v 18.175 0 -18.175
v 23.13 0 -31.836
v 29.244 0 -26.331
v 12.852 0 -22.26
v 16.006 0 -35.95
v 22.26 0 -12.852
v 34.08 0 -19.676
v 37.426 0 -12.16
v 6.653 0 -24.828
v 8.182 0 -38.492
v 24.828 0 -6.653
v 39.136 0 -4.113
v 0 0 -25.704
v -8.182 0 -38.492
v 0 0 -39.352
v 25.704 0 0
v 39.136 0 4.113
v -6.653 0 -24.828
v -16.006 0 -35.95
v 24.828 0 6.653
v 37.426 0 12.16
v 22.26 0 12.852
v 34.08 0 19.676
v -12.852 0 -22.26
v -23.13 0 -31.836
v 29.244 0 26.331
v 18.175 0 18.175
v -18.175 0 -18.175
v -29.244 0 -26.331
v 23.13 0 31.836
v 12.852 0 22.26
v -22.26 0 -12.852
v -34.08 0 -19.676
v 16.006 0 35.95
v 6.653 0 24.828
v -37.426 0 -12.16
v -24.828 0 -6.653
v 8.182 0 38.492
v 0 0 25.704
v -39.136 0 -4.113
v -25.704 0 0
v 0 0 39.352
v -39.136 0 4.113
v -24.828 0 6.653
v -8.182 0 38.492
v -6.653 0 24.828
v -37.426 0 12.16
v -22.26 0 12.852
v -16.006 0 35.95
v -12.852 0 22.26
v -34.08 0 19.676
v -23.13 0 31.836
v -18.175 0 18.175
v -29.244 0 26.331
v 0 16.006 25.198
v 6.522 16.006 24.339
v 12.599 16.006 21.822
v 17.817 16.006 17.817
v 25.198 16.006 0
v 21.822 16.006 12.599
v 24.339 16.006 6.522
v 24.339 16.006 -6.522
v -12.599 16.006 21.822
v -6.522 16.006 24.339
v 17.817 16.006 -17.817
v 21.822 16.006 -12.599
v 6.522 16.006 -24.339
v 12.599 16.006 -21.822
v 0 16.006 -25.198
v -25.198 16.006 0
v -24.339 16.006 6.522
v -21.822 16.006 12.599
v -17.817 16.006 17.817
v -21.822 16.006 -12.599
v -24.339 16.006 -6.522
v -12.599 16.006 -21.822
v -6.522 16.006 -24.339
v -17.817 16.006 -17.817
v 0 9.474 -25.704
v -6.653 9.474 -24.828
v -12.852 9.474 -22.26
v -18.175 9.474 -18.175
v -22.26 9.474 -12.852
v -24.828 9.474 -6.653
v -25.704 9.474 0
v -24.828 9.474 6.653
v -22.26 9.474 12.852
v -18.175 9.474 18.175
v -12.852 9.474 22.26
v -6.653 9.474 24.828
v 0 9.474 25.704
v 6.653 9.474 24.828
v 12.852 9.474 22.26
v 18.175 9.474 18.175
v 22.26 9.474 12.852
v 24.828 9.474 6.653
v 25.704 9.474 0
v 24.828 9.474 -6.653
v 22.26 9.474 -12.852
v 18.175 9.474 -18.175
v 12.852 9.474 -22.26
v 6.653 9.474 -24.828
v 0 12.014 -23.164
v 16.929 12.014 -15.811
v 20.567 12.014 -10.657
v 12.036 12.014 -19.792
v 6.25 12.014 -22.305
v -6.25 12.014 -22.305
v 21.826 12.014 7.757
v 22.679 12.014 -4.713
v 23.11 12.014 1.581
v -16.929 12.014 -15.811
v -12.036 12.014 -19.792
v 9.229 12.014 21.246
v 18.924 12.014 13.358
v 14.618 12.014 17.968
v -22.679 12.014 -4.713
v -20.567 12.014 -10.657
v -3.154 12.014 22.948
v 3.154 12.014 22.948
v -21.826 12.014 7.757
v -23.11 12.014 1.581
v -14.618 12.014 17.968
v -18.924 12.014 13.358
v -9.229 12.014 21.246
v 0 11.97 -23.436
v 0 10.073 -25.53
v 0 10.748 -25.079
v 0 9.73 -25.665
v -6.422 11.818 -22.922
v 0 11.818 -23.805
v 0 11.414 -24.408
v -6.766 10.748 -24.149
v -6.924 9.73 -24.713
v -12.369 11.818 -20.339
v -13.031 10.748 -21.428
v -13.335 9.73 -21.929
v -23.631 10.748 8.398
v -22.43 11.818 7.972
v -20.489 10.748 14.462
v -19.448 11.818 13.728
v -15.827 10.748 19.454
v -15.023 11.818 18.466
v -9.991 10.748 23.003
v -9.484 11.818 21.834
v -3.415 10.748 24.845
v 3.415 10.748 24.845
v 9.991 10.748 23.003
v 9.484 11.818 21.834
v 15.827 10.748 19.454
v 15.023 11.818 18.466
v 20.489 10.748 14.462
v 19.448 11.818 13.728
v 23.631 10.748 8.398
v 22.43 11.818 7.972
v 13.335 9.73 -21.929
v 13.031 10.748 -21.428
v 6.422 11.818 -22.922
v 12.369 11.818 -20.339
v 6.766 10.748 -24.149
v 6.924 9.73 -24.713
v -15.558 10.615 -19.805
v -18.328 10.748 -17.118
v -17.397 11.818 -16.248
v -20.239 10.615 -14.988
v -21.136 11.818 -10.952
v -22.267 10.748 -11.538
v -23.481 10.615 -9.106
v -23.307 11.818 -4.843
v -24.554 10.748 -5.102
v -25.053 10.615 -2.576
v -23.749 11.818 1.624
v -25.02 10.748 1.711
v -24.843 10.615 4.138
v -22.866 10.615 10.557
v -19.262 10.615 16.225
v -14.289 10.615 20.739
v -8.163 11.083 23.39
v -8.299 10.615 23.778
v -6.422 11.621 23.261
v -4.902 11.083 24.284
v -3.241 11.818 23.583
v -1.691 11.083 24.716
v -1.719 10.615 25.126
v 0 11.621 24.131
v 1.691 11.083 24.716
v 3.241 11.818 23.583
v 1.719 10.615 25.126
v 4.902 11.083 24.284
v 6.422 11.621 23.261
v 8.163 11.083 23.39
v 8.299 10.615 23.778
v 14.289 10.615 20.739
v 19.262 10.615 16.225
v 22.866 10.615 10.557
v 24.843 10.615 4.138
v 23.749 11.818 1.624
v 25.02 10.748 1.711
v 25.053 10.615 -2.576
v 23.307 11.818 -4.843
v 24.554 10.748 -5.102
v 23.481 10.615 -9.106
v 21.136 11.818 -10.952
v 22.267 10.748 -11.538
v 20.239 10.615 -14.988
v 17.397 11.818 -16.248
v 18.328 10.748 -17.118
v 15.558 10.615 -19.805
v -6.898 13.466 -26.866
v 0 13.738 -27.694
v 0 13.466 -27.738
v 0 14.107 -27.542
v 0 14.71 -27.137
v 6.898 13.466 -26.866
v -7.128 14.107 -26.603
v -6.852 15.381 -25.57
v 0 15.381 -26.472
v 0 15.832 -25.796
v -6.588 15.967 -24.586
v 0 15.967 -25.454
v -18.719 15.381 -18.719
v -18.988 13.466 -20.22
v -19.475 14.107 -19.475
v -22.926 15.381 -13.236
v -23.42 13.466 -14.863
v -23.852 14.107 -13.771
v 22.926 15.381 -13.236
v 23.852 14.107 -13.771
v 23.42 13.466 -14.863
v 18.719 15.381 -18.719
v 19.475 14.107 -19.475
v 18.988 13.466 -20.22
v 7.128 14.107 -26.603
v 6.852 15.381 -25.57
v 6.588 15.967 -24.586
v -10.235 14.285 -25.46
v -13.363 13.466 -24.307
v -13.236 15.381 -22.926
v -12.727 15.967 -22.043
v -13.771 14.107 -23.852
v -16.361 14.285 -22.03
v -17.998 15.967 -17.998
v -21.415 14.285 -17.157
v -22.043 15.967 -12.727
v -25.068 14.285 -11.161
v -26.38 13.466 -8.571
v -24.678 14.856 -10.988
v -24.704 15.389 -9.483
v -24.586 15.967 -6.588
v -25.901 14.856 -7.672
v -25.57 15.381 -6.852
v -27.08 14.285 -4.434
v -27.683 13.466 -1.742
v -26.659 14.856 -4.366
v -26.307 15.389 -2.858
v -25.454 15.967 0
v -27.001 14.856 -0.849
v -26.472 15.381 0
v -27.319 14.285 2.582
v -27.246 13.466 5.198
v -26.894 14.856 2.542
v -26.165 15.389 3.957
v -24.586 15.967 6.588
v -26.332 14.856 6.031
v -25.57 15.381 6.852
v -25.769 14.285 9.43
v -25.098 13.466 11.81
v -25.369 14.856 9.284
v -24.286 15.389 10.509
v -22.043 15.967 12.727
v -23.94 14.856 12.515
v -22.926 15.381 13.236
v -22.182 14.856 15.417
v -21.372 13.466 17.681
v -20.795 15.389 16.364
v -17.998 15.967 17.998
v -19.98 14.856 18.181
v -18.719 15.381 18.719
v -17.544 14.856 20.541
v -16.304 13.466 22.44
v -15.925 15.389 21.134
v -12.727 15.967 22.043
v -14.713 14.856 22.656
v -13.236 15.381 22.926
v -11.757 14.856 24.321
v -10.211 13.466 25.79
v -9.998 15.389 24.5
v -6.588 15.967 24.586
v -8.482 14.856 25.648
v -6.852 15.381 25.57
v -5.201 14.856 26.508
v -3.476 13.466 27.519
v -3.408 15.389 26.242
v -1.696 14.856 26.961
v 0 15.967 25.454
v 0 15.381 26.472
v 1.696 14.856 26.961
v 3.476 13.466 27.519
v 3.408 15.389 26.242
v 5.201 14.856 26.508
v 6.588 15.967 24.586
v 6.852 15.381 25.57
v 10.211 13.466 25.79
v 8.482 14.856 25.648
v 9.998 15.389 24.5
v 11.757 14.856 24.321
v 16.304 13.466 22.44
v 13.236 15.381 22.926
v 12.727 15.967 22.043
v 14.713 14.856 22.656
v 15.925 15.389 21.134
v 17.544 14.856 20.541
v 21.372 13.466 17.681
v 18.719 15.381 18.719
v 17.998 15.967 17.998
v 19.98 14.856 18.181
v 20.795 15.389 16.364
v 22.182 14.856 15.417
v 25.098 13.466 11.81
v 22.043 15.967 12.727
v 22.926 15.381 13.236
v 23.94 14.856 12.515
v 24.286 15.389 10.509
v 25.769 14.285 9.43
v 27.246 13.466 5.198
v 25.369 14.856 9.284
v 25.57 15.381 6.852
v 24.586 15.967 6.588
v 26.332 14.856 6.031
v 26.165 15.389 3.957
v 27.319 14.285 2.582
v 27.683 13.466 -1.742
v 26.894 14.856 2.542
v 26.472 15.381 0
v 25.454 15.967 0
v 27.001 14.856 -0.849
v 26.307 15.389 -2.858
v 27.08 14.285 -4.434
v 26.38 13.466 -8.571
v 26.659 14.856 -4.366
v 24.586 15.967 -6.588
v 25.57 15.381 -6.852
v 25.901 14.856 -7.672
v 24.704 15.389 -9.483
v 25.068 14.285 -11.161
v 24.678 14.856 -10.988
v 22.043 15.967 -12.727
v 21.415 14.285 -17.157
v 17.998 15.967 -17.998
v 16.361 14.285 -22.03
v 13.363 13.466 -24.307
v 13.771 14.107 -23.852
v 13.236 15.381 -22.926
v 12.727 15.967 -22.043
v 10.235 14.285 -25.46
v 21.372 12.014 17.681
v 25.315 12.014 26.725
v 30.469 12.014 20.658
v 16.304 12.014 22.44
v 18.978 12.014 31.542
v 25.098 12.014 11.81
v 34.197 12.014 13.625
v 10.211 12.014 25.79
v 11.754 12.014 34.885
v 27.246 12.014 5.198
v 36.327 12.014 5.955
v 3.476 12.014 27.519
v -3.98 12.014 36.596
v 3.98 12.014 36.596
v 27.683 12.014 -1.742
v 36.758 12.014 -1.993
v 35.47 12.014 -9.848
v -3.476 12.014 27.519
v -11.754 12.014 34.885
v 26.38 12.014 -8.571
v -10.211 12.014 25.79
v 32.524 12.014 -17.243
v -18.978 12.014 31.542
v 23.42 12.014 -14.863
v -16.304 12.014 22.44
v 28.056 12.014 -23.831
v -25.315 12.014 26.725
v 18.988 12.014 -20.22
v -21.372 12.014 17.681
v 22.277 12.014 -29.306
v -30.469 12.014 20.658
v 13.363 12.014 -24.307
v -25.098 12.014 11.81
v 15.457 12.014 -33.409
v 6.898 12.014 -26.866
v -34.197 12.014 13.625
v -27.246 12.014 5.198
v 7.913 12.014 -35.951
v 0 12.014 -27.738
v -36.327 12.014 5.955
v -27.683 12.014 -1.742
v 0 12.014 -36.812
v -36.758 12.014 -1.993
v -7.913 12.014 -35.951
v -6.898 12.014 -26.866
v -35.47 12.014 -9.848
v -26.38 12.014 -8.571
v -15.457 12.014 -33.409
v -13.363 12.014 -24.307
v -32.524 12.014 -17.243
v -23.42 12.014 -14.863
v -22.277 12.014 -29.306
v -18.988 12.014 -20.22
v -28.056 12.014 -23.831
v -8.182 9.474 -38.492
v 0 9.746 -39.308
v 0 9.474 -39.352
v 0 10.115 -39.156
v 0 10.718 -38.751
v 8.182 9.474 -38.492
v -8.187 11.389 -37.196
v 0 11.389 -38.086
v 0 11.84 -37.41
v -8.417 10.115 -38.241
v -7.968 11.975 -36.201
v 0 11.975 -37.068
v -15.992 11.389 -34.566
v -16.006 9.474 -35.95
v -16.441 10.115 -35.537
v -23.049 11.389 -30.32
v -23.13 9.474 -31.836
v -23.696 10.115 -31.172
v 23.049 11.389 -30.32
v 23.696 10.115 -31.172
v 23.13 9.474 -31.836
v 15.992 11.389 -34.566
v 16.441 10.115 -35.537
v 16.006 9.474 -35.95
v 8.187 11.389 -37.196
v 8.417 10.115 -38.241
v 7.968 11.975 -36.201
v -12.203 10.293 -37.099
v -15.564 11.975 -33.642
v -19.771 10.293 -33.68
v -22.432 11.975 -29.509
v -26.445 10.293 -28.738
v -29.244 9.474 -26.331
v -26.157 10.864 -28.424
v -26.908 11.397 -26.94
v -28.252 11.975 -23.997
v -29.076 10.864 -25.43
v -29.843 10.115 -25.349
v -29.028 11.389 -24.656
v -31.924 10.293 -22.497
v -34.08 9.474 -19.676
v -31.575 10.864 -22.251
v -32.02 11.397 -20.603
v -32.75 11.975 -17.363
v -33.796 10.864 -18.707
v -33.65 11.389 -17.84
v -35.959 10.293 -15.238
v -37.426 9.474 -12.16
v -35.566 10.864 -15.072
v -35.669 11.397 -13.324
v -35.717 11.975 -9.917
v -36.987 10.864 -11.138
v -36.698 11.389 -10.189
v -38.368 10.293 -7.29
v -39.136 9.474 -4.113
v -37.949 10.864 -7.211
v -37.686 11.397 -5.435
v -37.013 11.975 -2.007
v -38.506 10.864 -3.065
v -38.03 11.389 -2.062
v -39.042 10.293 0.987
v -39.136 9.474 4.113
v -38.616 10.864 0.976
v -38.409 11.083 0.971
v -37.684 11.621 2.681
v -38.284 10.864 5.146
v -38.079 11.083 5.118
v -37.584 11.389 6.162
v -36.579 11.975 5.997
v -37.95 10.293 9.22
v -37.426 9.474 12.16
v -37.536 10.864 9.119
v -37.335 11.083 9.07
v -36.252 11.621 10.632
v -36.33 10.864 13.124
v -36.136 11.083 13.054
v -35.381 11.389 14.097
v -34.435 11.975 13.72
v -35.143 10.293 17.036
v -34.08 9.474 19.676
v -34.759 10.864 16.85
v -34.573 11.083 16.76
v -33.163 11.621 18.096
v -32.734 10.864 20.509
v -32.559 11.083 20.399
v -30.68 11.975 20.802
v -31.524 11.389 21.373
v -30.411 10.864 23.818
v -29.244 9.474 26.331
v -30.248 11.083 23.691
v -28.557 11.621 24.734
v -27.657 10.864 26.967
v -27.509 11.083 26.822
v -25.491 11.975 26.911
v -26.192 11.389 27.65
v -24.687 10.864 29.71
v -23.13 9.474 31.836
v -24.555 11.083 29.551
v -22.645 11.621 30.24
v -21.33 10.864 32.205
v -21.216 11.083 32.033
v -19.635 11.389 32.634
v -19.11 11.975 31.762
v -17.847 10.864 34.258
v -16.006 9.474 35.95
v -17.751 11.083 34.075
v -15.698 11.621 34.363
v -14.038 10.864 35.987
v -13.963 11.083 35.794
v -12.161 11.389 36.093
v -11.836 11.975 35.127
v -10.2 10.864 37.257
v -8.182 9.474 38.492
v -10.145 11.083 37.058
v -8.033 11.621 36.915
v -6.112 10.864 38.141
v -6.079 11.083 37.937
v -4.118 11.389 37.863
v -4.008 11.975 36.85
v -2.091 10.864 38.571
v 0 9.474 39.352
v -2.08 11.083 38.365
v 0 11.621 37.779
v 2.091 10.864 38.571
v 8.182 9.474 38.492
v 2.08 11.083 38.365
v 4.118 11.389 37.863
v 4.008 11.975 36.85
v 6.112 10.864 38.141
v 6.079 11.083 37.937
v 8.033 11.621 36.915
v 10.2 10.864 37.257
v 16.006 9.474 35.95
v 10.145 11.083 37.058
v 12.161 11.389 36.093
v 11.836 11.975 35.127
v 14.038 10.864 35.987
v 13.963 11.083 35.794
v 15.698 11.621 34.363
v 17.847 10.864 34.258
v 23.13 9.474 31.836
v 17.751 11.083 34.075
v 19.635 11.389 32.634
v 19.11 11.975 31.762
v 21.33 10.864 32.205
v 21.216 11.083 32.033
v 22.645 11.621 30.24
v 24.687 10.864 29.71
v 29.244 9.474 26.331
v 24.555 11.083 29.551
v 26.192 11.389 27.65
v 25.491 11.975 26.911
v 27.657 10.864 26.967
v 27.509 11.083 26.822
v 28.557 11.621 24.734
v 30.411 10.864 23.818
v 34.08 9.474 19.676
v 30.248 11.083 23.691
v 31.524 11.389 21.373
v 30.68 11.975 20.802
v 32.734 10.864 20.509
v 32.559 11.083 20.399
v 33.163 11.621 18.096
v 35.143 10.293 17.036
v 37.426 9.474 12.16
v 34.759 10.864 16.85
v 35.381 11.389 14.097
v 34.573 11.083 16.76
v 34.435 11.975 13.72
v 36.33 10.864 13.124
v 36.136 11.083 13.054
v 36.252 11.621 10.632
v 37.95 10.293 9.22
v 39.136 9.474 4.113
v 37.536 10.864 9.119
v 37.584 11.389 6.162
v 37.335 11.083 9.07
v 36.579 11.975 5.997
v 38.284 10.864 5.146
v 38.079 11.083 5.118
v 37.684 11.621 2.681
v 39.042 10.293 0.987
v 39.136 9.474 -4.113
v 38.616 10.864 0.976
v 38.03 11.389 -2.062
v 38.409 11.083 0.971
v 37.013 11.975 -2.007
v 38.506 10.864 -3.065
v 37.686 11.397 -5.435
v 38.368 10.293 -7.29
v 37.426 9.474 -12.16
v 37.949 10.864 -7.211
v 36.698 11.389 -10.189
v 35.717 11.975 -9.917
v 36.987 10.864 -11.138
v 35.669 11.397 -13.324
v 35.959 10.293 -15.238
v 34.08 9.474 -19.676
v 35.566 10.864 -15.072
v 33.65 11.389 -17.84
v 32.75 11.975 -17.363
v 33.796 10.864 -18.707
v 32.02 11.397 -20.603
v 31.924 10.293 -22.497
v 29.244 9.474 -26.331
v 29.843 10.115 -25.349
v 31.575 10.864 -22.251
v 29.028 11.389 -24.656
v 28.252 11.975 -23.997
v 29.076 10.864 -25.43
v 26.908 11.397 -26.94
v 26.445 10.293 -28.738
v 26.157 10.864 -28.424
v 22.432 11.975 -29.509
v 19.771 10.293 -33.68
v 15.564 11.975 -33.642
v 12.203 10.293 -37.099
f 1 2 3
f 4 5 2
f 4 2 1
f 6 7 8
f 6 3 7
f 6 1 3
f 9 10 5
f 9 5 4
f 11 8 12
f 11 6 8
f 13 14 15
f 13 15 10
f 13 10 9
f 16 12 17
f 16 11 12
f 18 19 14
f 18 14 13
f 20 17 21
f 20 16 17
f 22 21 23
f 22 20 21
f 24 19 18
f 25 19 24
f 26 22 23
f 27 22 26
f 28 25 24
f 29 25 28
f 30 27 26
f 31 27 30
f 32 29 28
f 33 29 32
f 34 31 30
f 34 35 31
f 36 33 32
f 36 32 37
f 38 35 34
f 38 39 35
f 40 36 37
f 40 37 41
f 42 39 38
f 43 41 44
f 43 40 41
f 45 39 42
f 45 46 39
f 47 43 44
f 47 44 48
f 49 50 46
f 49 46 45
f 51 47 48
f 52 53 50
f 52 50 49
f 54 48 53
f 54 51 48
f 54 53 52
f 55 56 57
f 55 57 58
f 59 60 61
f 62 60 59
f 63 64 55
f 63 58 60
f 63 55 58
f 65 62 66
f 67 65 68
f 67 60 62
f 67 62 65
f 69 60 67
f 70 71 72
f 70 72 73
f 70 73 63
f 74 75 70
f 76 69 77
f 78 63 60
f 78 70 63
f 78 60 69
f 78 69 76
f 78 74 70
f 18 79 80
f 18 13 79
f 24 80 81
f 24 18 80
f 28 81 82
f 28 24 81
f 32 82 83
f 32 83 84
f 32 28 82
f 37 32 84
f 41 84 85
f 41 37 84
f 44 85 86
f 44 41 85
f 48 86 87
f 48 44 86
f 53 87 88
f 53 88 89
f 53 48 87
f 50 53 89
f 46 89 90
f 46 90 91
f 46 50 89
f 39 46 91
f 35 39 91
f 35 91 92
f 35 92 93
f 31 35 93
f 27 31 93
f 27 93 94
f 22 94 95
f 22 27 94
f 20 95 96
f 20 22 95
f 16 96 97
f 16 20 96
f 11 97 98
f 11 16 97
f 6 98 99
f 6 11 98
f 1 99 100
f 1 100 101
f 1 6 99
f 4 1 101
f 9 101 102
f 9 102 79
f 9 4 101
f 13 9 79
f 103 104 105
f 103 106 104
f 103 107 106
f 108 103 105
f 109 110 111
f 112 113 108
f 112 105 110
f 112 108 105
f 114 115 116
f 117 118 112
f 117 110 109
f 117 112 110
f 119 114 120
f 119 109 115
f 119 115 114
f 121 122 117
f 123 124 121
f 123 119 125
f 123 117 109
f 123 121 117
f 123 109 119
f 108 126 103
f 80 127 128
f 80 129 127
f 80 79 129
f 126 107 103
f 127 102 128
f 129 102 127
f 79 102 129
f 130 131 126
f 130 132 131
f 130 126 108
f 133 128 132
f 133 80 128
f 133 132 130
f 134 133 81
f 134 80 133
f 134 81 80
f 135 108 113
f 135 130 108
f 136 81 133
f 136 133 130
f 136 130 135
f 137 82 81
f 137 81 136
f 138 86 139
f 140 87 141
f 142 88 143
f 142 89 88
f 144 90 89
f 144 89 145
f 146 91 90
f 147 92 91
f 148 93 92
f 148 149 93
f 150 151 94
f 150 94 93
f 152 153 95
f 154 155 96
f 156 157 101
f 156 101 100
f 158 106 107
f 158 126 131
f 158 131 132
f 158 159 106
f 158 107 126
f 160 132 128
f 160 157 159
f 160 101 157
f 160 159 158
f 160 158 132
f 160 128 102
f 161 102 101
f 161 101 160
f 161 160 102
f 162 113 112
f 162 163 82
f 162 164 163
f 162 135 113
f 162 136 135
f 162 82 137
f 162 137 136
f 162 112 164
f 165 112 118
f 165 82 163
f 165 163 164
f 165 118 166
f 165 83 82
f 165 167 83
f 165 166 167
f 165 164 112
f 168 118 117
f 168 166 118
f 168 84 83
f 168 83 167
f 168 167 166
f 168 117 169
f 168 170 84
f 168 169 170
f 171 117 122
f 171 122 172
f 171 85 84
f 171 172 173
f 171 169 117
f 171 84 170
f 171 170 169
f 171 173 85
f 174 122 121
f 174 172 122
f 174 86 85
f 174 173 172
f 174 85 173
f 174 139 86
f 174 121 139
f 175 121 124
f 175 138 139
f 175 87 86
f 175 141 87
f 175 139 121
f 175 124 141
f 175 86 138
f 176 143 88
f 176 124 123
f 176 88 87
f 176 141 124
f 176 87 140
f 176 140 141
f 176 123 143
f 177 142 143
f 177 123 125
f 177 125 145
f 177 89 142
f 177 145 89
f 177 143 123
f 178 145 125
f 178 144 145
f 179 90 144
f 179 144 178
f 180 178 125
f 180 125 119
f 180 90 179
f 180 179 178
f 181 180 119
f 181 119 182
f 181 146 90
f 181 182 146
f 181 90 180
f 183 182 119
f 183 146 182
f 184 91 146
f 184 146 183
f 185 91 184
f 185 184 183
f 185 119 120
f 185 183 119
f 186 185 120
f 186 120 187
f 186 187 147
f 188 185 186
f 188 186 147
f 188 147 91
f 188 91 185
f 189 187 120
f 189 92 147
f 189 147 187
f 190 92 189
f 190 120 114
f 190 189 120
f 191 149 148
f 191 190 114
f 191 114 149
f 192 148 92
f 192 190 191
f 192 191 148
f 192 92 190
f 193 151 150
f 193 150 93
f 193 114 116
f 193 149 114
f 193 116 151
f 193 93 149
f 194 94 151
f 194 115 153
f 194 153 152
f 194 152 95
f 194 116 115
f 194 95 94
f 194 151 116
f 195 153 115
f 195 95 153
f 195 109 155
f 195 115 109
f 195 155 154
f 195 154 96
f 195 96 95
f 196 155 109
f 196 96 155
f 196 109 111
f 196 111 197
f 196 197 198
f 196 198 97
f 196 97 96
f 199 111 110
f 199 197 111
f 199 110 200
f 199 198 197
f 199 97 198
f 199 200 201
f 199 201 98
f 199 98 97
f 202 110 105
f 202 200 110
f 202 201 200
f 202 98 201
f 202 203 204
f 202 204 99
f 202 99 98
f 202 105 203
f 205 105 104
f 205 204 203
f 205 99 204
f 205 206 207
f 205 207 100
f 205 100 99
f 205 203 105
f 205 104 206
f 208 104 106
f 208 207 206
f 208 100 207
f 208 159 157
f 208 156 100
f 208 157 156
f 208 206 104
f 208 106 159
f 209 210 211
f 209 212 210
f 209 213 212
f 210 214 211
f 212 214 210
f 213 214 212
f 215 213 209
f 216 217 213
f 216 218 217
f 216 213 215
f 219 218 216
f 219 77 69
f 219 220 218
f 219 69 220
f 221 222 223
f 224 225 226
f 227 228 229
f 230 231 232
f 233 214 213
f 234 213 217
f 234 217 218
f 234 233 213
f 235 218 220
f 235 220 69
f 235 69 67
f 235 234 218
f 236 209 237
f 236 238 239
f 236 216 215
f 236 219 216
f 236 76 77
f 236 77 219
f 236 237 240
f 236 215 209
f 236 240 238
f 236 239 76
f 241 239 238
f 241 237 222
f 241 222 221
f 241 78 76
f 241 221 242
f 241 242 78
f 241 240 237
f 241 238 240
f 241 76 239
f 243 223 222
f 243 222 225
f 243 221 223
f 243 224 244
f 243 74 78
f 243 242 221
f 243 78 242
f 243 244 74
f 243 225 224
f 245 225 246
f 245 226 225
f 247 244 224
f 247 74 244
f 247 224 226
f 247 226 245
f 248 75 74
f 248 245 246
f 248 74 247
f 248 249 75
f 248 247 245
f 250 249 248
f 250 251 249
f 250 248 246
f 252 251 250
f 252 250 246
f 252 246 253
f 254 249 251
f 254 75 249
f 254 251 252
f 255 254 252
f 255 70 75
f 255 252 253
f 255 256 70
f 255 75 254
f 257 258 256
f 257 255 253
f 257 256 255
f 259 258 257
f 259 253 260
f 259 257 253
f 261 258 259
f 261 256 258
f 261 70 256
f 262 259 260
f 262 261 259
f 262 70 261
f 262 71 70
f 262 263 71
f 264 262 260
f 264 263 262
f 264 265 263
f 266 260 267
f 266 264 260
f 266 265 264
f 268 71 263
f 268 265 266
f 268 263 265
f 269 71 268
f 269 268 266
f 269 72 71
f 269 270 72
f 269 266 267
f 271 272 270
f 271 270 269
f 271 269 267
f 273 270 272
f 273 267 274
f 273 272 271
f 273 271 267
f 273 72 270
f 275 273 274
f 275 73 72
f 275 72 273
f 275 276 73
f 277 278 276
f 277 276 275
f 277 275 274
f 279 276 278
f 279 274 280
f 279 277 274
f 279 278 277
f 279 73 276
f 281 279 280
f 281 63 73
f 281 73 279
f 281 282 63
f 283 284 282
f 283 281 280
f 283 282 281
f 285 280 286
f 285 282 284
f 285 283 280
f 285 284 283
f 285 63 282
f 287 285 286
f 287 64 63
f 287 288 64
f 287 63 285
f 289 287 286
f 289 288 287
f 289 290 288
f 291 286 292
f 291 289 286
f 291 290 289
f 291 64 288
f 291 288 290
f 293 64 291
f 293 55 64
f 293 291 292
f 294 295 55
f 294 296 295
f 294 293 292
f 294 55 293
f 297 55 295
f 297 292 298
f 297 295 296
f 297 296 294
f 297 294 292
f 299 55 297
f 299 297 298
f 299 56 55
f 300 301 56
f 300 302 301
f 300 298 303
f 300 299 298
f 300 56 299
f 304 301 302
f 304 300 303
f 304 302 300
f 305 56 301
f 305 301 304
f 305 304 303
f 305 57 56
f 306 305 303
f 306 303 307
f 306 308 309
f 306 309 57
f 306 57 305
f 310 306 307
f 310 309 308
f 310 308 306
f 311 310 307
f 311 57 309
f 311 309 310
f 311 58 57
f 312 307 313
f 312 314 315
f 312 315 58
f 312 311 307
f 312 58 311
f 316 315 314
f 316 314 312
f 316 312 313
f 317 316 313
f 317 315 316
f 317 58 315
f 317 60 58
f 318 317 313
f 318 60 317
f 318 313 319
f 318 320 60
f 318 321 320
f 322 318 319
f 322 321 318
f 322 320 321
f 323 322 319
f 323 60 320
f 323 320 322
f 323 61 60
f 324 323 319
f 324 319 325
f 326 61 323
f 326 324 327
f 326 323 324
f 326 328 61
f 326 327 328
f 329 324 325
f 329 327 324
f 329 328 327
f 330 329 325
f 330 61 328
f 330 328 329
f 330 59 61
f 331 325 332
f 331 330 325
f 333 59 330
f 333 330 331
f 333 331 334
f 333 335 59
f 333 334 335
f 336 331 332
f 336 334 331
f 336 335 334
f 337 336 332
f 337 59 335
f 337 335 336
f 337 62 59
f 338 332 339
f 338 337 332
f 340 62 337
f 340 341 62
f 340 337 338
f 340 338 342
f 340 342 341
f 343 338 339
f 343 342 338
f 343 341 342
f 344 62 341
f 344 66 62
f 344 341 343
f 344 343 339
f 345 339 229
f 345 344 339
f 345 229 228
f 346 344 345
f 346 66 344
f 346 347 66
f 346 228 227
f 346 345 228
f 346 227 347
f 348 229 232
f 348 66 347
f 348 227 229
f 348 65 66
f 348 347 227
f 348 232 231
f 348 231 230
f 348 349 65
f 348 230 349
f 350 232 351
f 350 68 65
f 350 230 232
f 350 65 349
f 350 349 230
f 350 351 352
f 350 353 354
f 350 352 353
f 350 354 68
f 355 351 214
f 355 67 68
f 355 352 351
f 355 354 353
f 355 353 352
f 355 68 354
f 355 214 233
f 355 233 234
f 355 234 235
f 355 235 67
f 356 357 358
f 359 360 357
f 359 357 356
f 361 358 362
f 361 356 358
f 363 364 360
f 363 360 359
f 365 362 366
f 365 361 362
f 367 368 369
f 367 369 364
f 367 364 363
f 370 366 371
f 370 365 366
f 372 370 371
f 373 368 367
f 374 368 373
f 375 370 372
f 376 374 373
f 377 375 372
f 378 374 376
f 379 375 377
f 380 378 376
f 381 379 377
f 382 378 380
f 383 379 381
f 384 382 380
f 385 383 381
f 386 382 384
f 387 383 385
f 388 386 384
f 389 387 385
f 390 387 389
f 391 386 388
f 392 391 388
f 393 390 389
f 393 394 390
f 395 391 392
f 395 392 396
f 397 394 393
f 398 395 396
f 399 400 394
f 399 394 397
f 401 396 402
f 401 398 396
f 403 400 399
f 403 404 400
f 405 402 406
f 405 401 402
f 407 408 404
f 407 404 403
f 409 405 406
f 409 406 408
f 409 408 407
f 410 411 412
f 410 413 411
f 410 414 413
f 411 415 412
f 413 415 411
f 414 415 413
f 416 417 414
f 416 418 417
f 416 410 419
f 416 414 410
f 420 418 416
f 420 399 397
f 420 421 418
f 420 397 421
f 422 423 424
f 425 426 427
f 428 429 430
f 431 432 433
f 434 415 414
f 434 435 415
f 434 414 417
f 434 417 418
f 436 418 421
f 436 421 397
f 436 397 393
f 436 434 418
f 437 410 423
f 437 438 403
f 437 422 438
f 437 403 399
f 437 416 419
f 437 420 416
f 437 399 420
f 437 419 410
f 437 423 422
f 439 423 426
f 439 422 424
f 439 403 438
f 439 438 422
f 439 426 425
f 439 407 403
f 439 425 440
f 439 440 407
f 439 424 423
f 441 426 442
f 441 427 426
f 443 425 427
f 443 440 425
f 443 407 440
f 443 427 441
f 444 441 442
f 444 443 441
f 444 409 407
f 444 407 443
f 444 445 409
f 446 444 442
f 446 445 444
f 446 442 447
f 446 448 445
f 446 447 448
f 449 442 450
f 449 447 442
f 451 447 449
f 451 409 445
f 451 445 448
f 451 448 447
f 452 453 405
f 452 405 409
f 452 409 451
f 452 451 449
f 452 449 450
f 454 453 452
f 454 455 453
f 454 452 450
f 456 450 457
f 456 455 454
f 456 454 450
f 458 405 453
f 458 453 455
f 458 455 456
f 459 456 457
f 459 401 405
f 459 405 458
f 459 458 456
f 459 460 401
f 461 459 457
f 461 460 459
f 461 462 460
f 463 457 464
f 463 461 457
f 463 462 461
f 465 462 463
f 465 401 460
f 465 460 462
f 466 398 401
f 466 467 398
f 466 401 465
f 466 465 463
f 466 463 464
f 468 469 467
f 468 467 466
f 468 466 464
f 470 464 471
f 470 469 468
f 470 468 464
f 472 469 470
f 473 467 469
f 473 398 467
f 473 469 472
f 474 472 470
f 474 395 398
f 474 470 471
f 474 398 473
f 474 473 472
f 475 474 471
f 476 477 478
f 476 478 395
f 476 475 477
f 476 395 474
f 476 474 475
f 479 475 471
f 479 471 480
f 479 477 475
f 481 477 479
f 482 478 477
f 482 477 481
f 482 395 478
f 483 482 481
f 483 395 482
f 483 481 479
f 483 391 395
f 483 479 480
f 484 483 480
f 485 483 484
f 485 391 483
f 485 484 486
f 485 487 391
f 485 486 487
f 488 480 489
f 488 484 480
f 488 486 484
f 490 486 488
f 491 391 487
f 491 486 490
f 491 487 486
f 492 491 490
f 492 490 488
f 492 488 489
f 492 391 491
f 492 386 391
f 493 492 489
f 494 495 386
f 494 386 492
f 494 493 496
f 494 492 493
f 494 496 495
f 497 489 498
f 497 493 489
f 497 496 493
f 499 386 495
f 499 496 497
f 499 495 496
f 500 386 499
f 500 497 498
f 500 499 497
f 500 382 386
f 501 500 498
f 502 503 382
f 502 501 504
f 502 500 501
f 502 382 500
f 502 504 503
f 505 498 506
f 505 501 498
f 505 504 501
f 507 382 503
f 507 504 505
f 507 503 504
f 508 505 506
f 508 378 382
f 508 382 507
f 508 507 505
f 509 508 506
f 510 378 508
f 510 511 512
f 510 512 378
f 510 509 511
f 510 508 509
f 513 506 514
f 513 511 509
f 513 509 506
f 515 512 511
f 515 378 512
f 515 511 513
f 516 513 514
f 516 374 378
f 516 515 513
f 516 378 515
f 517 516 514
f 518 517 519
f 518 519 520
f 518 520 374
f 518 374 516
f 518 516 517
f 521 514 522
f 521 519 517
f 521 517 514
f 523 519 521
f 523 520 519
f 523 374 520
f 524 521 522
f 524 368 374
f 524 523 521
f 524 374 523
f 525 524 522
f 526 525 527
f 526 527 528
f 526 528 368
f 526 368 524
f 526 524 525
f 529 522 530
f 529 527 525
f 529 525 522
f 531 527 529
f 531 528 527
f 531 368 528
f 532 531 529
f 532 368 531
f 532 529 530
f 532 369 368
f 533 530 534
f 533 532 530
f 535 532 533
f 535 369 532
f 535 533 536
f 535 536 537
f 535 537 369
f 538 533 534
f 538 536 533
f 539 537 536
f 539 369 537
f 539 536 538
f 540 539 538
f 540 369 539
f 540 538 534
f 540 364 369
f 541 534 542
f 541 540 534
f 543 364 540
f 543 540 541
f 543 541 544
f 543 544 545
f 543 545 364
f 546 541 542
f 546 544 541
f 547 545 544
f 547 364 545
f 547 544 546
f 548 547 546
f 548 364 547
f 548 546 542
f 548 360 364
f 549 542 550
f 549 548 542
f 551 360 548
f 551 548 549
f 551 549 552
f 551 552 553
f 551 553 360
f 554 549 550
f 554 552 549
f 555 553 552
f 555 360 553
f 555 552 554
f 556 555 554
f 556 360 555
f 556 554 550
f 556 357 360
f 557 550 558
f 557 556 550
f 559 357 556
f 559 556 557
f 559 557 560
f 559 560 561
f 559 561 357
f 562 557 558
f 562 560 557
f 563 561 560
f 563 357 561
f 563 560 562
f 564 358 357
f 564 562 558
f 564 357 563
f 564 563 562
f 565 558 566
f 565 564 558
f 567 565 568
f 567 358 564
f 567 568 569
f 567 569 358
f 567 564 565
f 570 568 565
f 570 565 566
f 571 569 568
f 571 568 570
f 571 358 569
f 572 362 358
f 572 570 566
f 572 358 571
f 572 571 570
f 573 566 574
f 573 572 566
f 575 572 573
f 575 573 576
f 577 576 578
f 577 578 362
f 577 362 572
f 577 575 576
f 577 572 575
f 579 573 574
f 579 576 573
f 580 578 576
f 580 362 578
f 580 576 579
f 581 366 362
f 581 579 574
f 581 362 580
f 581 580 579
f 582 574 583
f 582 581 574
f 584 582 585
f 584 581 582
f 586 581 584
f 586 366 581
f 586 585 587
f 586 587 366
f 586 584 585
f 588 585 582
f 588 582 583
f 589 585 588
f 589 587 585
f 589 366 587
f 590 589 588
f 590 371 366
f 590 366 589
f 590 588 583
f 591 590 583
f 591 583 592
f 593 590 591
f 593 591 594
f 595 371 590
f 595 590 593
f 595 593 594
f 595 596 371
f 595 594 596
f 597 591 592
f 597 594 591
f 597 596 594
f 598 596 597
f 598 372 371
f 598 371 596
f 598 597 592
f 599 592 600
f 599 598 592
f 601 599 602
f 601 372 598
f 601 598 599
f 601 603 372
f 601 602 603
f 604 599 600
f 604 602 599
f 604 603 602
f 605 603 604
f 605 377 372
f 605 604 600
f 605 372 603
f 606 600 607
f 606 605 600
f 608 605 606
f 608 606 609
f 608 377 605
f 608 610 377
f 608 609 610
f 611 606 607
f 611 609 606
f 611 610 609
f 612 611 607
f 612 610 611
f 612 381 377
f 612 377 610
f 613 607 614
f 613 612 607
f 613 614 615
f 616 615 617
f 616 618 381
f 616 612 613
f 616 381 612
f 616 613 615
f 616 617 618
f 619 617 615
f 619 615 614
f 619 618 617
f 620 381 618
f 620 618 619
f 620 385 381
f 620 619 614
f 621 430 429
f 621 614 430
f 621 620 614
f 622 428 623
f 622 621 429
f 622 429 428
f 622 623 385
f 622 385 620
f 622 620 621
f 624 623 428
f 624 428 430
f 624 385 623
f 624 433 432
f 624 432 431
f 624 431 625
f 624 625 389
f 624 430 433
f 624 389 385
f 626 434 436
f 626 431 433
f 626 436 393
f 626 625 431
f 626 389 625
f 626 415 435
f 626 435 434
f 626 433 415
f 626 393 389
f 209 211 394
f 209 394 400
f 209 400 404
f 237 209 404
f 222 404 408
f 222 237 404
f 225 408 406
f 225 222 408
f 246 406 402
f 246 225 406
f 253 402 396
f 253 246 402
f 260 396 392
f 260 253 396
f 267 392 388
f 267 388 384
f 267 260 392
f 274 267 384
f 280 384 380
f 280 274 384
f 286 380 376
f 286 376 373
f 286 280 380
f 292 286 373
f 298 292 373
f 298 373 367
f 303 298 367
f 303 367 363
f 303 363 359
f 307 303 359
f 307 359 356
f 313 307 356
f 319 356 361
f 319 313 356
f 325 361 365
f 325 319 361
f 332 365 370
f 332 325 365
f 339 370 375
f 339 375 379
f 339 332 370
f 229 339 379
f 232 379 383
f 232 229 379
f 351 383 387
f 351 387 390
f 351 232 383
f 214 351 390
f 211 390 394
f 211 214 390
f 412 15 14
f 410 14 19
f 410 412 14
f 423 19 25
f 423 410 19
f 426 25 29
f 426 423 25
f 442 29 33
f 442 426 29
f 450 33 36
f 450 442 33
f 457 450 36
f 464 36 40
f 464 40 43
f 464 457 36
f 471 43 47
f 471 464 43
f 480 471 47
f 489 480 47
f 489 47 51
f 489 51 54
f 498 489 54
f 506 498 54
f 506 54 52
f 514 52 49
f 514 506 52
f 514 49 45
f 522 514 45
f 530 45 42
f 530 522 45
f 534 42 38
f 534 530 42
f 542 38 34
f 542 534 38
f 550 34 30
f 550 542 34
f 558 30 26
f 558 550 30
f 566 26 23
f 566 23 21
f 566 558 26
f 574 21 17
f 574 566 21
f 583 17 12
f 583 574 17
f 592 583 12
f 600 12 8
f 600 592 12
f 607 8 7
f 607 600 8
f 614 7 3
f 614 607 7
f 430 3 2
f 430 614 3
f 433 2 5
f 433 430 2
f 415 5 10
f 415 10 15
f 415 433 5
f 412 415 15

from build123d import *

# Parameters (mm, degrees)
FILLET1_SIZE = 2.54


with BuildPart() as part:
    # Sketch1 → Revolve1 (revolve)
    with BuildSketch(Plane.XY, mode=Mode.PRIVATE) as revolve1_sk:
        Polygon((25.703882473, 0), (39.351675245, 0), (39.351675245, 12.013848808), (27.737641542, 12.013848808), (27.737641542, 16.005835686), (0, 16.005835686), (0, 12.013848808), (25.703882473, 12.013848808), align=None)
    revolve(revolve1_sk.sketch.rotate(Axis((0, 0, 0), (0, 1, 0)), 90), axis=Axis((0, 0, 0), (0, 1, 0)))

    # Fillet1
    # a fillet whose section is not a circle: 2.54 mm, written as the material it adds along each edge
    with BuildSketch(Plane(origin=(0, 12.013848808, 0), x_dir=(0, 0, -1), z_dir=(1, 0, 0))) as fillet1_piece_1:
        with BuildLine():
            Bezier((25.703882473 - FILLET1_SIZE, 0), (25.703882473, 0), (25.703882473, -FILLET1_SIZE), weights=[1, 0.365051062, 1])
            Line((25.703882473, -FILLET1_SIZE), (25.703882473, 0))
            Line((25.703882473, 0), (25.703882473 - FILLET1_SIZE, 0))
        make_face()
    revolve(axis=Axis((0, 12.013848808, 0), (0, 1, 0)))
    # a fillet whose section is not a circle: 2.54 mm, written as the material it takes off along each edge
    with BuildSketch(Plane(origin=(0, 16.005835686, 0), x_dir=(0, 0, -1), z_dir=(1, 0, 0))) as fillet1_2_piece_1:
        with BuildLine():
            Bezier((27.737641542, -FILLET1_SIZE), (27.737641542, 0), (27.737641542 - FILLET1_SIZE, 0), weights=[1, 0.365051062, 1])
            Line((27.737641542 - FILLET1_SIZE, 0), (27.737641542, 0))
            Line((27.737641542, 0), (27.737641542, -FILLET1_SIZE))
        make_face()
    revolve(axis=Axis((0, 16.005835686, 0), (0, 1, 0)), mode=Mode.SUBTRACT)
    with BuildSketch(Plane(origin=(0, 12.013848808, 0), x_dir=(0, 0, -1), z_dir=(1, 0, 0))) as fillet1_2_piece_2:
        with BuildLine():
            Bezier((39.351675245, -FILLET1_SIZE), (39.351675245, 0), (39.351675245 - FILLET1_SIZE, 0), weights=[1, 0.365051062, 1])
            Line((39.351675245 - FILLET1_SIZE, 0), (39.351675245, 0))
            Line((39.351675245, 0), (39.351675245, -FILLET1_SIZE))
        make_face()
    revolve(axis=Axis((0, 12.013848808, 0), (0, 1, 0)), mode=Mode.SUBTRACT)


solid = part.part
